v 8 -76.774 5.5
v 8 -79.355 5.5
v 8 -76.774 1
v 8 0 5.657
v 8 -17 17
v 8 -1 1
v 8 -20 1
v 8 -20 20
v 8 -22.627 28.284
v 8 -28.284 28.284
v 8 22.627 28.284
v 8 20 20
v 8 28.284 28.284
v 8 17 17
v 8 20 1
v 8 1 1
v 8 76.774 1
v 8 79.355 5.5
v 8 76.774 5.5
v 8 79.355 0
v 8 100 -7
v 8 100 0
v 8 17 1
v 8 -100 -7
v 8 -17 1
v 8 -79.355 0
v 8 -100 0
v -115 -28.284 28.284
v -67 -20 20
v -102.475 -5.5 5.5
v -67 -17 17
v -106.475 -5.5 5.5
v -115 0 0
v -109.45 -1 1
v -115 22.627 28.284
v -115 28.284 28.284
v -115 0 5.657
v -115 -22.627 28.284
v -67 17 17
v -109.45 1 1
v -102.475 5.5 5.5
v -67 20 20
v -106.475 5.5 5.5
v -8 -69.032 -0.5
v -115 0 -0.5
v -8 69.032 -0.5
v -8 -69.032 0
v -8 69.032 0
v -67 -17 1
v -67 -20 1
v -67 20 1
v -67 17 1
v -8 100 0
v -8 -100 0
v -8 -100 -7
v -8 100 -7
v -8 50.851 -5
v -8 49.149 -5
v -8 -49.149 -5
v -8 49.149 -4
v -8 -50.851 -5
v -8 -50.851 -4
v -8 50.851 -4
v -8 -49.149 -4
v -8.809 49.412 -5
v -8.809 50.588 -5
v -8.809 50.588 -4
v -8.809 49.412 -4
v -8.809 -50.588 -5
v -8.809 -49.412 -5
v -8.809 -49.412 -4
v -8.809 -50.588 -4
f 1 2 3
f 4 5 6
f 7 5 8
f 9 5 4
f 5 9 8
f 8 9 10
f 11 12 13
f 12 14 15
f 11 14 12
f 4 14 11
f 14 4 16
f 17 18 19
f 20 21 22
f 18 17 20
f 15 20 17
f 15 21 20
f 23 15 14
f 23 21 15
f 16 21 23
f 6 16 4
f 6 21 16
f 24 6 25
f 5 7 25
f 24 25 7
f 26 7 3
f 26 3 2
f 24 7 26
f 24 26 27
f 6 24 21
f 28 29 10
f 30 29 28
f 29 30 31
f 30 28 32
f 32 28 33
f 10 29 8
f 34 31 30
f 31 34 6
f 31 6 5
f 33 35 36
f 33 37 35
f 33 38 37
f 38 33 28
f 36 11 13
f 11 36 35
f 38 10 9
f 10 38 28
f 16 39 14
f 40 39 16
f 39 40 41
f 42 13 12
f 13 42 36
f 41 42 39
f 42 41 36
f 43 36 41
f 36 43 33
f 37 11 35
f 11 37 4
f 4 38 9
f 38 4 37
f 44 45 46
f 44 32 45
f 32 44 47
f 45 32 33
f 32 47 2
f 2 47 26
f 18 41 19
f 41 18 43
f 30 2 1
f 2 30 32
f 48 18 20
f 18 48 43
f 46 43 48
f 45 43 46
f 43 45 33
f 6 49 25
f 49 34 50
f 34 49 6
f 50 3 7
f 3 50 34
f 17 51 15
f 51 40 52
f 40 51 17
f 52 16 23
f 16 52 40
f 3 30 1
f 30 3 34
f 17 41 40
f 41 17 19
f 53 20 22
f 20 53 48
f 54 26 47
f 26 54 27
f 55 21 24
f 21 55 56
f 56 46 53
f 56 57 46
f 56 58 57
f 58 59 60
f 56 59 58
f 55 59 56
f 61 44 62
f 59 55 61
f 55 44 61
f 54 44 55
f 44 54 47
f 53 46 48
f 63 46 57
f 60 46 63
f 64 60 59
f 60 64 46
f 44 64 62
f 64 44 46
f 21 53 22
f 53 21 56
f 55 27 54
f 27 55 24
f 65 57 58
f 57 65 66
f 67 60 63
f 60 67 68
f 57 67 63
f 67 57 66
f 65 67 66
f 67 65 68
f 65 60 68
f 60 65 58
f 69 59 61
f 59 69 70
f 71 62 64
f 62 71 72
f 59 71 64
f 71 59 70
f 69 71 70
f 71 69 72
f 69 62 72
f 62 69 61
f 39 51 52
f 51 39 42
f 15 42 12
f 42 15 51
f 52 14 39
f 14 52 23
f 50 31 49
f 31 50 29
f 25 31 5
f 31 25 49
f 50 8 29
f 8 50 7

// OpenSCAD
//band saw slider guide for holding cylinders
 

// current throat is 3 inch
//slider channel is 11.5 inches
//echo(25.4*11.5);    //292 mm
//echo(25.4*3);       //76 mm

// make a ruler to check



slider_w = 16;
slider_h = 7;  //need to check depth of saw
slider_l = 200;
alpha=.8;

throat_slider_distance=115;

//how thick to make V guide? 4 mil?
v_thickness=4;
v_length=40;

v_holder = [[0,0],[0,v_length],[v_length,0]]; // triangle for holder
v_holder_path = [0,1,2]; // triangle paths

module band_saw_guide()
{
translate([8,0,0])
{
rotate([0,-90,0]){
rotate([0,0,-45]){
difference(){
  linear_extrude(height=123){
        polygon(points=v_holder,paths=[v_holder_path]);
        }
    
    translate([v_thickness,v_thickness,-1]){
        cube([v_length,v_length,v_length+200]);
    }
}

    }
}
}



module tri_base(x1=-throat_slider_distance,y1=0,x2=9,y2=.5*slider_l-20,x3=9,y3=-.5*slider_l+20)
{
 linear_extrude(6)
    {
        polygon(points=[[x1,y1],[x2,y2],[x3,y3]]);
        }
}




difference(){
translate([0,0,-.5])
    { color("purple",alpha)
        tri_base();
        }

translate([4,0,1])
    {color("orange",alpha)
        tri_base();
        }
    }

//slider guide
    
color("cornflowerblue",alpha)

translate([0,0,-0.5*slider_h]){
    cube([slider_w ,slider_l ,slider_h],center=true);}

translate ([-8,50,-5])
    {
        linear_extrude(1){circle(1);}
    }

mirror([0,50,0])
    {
        translate ([-8,50,-5])
            {
                linear_extrude(1){circle(1);}
                }
            }



// needs some suports for the V holder
    color("orange")
    mirror([0,20,0])
    {
    translate([-67,-20,0])
    {
    cube([80,3,20]);
    }
}
translate([-67,-20,0])
    {
    cube([80,3,20]);
    }
}


//band_saw_guide();


difference()
{
    band_saw_guide();

    translate([16,0,10])
        {
        cube([slider_w ,slider_l ,slider_h+50],center=true);
        }
}
